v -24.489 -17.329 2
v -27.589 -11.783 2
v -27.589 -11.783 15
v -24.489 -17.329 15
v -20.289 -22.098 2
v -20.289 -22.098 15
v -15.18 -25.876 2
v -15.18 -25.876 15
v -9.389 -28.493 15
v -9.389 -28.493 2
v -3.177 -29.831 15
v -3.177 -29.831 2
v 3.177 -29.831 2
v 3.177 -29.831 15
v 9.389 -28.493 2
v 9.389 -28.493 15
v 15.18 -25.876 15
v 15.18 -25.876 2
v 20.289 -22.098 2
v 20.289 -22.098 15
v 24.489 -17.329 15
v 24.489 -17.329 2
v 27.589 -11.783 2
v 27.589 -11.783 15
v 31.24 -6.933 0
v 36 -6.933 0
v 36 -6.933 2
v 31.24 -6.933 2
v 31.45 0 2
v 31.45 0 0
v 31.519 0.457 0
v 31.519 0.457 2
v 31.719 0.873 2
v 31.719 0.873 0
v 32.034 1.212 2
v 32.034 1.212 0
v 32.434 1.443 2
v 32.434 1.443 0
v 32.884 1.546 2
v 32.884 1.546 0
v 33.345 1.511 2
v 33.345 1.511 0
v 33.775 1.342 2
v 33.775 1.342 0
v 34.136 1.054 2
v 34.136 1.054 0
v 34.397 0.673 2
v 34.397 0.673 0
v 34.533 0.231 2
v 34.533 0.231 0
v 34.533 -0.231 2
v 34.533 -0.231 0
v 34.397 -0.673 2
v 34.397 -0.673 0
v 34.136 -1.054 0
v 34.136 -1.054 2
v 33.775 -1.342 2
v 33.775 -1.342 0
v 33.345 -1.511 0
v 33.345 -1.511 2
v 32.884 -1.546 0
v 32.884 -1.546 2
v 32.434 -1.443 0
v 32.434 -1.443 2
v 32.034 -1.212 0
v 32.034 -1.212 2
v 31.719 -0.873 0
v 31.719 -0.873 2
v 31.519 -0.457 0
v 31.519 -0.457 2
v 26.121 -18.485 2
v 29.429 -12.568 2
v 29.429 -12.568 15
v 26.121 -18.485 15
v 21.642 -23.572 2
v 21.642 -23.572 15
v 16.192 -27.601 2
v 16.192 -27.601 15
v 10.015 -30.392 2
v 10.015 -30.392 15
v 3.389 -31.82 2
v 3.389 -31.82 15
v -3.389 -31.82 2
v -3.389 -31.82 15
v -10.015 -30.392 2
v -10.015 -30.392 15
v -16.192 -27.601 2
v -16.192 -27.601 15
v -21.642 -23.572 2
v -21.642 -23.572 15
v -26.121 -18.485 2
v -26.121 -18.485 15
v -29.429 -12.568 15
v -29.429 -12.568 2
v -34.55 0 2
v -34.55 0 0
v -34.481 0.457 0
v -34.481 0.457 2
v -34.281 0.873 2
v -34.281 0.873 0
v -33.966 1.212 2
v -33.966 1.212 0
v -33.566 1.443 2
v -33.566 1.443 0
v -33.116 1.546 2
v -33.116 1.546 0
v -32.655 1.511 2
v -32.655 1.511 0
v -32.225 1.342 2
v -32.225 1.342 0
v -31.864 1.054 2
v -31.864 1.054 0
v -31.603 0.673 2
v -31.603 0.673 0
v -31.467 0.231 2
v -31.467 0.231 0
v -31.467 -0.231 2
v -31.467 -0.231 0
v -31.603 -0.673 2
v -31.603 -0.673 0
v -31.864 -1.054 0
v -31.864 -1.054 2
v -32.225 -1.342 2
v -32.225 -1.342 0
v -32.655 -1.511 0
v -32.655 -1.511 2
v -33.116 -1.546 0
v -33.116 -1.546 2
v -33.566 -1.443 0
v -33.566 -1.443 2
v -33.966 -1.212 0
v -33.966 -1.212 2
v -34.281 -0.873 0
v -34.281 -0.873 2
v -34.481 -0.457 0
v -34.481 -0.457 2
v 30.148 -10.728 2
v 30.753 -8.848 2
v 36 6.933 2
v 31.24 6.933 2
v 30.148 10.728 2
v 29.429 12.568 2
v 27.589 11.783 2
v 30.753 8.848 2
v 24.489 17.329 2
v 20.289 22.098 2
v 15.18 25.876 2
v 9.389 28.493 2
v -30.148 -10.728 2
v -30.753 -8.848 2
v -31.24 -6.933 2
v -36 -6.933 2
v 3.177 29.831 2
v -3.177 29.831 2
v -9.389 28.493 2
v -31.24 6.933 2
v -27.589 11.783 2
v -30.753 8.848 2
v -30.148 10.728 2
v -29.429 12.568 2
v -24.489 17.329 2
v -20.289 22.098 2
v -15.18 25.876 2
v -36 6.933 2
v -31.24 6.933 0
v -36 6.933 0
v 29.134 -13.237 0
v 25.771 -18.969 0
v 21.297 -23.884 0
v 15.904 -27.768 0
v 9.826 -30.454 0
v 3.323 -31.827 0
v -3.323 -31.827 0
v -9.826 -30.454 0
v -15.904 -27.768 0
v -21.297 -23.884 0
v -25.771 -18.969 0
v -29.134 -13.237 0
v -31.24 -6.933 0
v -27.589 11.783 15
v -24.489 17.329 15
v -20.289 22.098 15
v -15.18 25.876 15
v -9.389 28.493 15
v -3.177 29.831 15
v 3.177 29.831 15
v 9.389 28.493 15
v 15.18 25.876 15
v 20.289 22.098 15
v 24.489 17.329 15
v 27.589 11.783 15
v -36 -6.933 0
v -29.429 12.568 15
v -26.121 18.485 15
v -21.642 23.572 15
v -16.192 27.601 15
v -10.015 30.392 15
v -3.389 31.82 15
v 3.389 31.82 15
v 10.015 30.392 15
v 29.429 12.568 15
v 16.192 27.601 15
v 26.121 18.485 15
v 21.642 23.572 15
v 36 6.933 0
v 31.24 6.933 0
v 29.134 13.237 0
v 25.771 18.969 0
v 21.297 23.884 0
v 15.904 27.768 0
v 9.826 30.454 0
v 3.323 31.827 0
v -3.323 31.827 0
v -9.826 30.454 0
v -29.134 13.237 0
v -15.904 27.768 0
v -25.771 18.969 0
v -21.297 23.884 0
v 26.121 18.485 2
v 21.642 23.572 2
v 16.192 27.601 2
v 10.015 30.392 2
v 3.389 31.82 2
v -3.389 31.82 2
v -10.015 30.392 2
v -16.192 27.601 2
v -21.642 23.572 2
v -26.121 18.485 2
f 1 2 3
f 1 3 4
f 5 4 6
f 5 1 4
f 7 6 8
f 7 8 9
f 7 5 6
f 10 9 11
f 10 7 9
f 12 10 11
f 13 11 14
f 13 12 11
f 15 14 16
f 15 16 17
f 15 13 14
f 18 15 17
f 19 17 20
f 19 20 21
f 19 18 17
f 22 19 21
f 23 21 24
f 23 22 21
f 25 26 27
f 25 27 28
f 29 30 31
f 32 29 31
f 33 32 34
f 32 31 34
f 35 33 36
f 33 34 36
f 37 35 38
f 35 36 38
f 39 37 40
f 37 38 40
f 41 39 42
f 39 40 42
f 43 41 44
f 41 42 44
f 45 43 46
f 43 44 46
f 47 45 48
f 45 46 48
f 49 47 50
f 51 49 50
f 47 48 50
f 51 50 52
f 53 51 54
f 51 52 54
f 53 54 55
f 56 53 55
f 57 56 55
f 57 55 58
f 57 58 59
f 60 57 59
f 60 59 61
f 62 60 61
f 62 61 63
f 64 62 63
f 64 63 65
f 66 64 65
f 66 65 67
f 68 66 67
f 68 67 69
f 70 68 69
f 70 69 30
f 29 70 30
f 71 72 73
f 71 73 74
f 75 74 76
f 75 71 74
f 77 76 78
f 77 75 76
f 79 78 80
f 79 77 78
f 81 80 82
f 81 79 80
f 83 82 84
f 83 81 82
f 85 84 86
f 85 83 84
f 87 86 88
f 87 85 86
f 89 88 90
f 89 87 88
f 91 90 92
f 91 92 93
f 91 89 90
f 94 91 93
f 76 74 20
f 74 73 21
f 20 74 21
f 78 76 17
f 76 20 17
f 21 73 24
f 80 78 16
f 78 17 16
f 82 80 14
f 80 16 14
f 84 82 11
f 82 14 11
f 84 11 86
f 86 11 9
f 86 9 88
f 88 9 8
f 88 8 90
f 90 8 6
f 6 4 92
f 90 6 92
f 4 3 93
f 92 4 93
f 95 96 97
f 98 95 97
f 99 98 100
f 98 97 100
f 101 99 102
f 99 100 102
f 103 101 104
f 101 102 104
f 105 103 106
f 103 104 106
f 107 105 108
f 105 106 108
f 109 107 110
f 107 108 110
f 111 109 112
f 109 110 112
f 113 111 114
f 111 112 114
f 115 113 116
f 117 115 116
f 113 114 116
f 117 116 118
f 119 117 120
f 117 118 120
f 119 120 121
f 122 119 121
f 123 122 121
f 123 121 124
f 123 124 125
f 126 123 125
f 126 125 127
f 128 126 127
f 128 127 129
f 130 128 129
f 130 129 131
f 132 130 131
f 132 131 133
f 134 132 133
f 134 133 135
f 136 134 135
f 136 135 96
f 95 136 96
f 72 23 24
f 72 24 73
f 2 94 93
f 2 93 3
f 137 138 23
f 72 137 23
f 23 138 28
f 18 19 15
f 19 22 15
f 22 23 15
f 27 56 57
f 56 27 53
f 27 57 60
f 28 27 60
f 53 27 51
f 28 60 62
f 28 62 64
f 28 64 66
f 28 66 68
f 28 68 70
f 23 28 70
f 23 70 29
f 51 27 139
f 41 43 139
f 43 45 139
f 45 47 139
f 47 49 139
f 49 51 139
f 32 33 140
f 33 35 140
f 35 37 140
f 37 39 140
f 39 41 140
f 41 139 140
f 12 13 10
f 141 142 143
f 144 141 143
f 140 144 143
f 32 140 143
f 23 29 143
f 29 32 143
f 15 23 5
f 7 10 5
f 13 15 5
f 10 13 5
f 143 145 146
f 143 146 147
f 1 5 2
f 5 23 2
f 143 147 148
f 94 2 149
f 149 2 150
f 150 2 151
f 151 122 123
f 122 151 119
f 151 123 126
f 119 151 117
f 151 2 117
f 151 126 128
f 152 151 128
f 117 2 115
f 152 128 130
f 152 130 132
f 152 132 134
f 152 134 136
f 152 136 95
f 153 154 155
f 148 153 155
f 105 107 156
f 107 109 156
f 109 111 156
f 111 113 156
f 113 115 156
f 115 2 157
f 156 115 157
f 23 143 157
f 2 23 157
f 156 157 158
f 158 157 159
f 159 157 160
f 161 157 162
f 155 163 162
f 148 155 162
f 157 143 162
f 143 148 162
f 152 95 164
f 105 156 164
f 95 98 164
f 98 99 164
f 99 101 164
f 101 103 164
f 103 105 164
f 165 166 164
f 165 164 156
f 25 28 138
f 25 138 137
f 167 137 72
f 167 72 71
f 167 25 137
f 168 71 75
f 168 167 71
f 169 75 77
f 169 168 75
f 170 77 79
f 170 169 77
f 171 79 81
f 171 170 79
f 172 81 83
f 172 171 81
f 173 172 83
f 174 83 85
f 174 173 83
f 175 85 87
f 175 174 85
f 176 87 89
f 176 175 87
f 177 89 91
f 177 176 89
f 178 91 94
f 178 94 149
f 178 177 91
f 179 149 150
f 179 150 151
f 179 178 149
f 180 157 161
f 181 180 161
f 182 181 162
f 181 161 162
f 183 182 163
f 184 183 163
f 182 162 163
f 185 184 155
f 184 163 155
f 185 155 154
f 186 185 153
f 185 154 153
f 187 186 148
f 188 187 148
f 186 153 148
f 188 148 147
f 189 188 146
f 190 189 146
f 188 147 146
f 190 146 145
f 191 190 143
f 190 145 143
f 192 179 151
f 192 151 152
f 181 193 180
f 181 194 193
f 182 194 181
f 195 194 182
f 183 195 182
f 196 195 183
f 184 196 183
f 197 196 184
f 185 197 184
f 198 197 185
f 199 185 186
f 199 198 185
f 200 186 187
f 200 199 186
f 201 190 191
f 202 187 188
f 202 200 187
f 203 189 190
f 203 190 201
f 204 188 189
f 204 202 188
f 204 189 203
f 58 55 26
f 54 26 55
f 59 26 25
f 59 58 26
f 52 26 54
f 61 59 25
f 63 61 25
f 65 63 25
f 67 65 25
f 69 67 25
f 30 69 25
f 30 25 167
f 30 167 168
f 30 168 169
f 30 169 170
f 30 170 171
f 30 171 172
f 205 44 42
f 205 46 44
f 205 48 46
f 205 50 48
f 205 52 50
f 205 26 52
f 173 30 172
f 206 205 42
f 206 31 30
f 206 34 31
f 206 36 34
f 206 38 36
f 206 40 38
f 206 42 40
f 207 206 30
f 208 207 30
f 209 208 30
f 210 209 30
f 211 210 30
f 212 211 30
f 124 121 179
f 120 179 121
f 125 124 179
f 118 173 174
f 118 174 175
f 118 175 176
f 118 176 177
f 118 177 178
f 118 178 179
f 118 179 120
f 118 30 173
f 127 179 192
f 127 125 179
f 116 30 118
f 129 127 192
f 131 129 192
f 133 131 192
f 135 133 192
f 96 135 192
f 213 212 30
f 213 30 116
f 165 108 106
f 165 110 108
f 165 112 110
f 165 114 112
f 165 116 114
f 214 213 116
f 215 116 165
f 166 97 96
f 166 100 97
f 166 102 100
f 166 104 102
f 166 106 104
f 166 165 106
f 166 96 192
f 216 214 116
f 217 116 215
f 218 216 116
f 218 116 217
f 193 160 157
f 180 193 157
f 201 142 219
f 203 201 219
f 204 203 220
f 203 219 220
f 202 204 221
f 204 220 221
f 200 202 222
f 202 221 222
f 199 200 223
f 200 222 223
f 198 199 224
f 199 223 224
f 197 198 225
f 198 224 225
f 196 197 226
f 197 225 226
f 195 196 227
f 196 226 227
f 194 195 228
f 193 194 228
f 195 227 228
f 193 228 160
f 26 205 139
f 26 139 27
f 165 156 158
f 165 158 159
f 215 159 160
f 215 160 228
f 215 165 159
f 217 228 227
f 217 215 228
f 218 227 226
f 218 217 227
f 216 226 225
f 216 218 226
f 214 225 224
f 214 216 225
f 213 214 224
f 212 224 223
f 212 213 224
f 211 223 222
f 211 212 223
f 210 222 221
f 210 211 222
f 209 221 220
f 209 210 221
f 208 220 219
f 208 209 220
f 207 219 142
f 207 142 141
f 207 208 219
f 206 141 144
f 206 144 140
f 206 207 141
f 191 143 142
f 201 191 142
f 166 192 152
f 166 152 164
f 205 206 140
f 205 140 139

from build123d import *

# Parameters (mm, degrees)
BOSS_EXTRUDE1_DEPTH = 2
BOSS_EXTRUDE2_DEPTH = 13
SKETCH3_R           = 1.55
CUT_EXTRUDE1_DEPTH  = 16


with BuildPart() as part:
    # Sketch1 → Boss-Extrude1 (new body)
    with BuildSketch(Plane.XY):
        with BuildLine():
            Line((-31.239860577, -6.933333333), (-36, -6.933333333))
            Line((-36, -6.933333333), (-36, 6.933333333))
            Line((-36, 6.933333333), (-31.239860577, 6.933333333))
            ThreePointArc((-31.239860577, 6.933333333), (0, 32), (31.239860577, 6.933333333))
            Line((31.239860577, 6.933333333), (36, 6.933333333))
            Line((36, 6.933333333), (36, -6.933333333))
            Line((36, -6.933333333), (31.239860577, -6.933333333))
            ThreePointArc((31.239860577, -6.933333333), (0, -32), (-31.239860577, -6.933333333))
        make_face()
    extrude(amount=BOSS_EXTRUDE1_DEPTH)

    # Sketch2 → Boss-Extrude2 (add)
    with BuildSketch(Plane.XY.offset(2)):
        with BuildLine():
            Line((-29.428567245, 12.568191195), (-27.589281792, 11.782679245))
            ThreePointArc((-27.589281792, 11.782679245), (0, 30), (27.589281792, 11.782679245))
            Line((27.589281792, 11.782679245), (29.428567245, 12.568191195))
            ThreePointArc((29.428567245, 12.568191195), (0, 32), (-29.428567245, 12.568191195))
        make_face()
        with BuildLine():
            Line((27.589281792, -11.782679245), (29.428567245, -12.568191195))
            ThreePointArc((29.428567245, -12.568191195), (0, -32), (-29.428567245, -12.568191195))
            Line((-29.428567245, -12.568191195), (-27.589281792, -11.782679245))
            ThreePointArc((-27.589281792, -11.782679245), (0, -30), (27.589281792, -11.782679245))
        make_face()
    extrude(amount=BOSS_EXTRUDE2_DEPTH)

    # Sketch3 → Cut-Extrude1 (cut, through all)
    with BuildSketch(Plane(origin=(0, 0, 0), x_dir=(-1, 0, 0), z_dir=(0, 0, -1))):
        with Locations((-33, 0)):
            Circle(SKETCH3_R)
        with Locations((33, 0)):
            Circle(SKETCH3_R)
    extrude(amount=-CUT_EXTRUDE1_DEPTH, mode=Mode.SUBTRACT)


solid = part.part
